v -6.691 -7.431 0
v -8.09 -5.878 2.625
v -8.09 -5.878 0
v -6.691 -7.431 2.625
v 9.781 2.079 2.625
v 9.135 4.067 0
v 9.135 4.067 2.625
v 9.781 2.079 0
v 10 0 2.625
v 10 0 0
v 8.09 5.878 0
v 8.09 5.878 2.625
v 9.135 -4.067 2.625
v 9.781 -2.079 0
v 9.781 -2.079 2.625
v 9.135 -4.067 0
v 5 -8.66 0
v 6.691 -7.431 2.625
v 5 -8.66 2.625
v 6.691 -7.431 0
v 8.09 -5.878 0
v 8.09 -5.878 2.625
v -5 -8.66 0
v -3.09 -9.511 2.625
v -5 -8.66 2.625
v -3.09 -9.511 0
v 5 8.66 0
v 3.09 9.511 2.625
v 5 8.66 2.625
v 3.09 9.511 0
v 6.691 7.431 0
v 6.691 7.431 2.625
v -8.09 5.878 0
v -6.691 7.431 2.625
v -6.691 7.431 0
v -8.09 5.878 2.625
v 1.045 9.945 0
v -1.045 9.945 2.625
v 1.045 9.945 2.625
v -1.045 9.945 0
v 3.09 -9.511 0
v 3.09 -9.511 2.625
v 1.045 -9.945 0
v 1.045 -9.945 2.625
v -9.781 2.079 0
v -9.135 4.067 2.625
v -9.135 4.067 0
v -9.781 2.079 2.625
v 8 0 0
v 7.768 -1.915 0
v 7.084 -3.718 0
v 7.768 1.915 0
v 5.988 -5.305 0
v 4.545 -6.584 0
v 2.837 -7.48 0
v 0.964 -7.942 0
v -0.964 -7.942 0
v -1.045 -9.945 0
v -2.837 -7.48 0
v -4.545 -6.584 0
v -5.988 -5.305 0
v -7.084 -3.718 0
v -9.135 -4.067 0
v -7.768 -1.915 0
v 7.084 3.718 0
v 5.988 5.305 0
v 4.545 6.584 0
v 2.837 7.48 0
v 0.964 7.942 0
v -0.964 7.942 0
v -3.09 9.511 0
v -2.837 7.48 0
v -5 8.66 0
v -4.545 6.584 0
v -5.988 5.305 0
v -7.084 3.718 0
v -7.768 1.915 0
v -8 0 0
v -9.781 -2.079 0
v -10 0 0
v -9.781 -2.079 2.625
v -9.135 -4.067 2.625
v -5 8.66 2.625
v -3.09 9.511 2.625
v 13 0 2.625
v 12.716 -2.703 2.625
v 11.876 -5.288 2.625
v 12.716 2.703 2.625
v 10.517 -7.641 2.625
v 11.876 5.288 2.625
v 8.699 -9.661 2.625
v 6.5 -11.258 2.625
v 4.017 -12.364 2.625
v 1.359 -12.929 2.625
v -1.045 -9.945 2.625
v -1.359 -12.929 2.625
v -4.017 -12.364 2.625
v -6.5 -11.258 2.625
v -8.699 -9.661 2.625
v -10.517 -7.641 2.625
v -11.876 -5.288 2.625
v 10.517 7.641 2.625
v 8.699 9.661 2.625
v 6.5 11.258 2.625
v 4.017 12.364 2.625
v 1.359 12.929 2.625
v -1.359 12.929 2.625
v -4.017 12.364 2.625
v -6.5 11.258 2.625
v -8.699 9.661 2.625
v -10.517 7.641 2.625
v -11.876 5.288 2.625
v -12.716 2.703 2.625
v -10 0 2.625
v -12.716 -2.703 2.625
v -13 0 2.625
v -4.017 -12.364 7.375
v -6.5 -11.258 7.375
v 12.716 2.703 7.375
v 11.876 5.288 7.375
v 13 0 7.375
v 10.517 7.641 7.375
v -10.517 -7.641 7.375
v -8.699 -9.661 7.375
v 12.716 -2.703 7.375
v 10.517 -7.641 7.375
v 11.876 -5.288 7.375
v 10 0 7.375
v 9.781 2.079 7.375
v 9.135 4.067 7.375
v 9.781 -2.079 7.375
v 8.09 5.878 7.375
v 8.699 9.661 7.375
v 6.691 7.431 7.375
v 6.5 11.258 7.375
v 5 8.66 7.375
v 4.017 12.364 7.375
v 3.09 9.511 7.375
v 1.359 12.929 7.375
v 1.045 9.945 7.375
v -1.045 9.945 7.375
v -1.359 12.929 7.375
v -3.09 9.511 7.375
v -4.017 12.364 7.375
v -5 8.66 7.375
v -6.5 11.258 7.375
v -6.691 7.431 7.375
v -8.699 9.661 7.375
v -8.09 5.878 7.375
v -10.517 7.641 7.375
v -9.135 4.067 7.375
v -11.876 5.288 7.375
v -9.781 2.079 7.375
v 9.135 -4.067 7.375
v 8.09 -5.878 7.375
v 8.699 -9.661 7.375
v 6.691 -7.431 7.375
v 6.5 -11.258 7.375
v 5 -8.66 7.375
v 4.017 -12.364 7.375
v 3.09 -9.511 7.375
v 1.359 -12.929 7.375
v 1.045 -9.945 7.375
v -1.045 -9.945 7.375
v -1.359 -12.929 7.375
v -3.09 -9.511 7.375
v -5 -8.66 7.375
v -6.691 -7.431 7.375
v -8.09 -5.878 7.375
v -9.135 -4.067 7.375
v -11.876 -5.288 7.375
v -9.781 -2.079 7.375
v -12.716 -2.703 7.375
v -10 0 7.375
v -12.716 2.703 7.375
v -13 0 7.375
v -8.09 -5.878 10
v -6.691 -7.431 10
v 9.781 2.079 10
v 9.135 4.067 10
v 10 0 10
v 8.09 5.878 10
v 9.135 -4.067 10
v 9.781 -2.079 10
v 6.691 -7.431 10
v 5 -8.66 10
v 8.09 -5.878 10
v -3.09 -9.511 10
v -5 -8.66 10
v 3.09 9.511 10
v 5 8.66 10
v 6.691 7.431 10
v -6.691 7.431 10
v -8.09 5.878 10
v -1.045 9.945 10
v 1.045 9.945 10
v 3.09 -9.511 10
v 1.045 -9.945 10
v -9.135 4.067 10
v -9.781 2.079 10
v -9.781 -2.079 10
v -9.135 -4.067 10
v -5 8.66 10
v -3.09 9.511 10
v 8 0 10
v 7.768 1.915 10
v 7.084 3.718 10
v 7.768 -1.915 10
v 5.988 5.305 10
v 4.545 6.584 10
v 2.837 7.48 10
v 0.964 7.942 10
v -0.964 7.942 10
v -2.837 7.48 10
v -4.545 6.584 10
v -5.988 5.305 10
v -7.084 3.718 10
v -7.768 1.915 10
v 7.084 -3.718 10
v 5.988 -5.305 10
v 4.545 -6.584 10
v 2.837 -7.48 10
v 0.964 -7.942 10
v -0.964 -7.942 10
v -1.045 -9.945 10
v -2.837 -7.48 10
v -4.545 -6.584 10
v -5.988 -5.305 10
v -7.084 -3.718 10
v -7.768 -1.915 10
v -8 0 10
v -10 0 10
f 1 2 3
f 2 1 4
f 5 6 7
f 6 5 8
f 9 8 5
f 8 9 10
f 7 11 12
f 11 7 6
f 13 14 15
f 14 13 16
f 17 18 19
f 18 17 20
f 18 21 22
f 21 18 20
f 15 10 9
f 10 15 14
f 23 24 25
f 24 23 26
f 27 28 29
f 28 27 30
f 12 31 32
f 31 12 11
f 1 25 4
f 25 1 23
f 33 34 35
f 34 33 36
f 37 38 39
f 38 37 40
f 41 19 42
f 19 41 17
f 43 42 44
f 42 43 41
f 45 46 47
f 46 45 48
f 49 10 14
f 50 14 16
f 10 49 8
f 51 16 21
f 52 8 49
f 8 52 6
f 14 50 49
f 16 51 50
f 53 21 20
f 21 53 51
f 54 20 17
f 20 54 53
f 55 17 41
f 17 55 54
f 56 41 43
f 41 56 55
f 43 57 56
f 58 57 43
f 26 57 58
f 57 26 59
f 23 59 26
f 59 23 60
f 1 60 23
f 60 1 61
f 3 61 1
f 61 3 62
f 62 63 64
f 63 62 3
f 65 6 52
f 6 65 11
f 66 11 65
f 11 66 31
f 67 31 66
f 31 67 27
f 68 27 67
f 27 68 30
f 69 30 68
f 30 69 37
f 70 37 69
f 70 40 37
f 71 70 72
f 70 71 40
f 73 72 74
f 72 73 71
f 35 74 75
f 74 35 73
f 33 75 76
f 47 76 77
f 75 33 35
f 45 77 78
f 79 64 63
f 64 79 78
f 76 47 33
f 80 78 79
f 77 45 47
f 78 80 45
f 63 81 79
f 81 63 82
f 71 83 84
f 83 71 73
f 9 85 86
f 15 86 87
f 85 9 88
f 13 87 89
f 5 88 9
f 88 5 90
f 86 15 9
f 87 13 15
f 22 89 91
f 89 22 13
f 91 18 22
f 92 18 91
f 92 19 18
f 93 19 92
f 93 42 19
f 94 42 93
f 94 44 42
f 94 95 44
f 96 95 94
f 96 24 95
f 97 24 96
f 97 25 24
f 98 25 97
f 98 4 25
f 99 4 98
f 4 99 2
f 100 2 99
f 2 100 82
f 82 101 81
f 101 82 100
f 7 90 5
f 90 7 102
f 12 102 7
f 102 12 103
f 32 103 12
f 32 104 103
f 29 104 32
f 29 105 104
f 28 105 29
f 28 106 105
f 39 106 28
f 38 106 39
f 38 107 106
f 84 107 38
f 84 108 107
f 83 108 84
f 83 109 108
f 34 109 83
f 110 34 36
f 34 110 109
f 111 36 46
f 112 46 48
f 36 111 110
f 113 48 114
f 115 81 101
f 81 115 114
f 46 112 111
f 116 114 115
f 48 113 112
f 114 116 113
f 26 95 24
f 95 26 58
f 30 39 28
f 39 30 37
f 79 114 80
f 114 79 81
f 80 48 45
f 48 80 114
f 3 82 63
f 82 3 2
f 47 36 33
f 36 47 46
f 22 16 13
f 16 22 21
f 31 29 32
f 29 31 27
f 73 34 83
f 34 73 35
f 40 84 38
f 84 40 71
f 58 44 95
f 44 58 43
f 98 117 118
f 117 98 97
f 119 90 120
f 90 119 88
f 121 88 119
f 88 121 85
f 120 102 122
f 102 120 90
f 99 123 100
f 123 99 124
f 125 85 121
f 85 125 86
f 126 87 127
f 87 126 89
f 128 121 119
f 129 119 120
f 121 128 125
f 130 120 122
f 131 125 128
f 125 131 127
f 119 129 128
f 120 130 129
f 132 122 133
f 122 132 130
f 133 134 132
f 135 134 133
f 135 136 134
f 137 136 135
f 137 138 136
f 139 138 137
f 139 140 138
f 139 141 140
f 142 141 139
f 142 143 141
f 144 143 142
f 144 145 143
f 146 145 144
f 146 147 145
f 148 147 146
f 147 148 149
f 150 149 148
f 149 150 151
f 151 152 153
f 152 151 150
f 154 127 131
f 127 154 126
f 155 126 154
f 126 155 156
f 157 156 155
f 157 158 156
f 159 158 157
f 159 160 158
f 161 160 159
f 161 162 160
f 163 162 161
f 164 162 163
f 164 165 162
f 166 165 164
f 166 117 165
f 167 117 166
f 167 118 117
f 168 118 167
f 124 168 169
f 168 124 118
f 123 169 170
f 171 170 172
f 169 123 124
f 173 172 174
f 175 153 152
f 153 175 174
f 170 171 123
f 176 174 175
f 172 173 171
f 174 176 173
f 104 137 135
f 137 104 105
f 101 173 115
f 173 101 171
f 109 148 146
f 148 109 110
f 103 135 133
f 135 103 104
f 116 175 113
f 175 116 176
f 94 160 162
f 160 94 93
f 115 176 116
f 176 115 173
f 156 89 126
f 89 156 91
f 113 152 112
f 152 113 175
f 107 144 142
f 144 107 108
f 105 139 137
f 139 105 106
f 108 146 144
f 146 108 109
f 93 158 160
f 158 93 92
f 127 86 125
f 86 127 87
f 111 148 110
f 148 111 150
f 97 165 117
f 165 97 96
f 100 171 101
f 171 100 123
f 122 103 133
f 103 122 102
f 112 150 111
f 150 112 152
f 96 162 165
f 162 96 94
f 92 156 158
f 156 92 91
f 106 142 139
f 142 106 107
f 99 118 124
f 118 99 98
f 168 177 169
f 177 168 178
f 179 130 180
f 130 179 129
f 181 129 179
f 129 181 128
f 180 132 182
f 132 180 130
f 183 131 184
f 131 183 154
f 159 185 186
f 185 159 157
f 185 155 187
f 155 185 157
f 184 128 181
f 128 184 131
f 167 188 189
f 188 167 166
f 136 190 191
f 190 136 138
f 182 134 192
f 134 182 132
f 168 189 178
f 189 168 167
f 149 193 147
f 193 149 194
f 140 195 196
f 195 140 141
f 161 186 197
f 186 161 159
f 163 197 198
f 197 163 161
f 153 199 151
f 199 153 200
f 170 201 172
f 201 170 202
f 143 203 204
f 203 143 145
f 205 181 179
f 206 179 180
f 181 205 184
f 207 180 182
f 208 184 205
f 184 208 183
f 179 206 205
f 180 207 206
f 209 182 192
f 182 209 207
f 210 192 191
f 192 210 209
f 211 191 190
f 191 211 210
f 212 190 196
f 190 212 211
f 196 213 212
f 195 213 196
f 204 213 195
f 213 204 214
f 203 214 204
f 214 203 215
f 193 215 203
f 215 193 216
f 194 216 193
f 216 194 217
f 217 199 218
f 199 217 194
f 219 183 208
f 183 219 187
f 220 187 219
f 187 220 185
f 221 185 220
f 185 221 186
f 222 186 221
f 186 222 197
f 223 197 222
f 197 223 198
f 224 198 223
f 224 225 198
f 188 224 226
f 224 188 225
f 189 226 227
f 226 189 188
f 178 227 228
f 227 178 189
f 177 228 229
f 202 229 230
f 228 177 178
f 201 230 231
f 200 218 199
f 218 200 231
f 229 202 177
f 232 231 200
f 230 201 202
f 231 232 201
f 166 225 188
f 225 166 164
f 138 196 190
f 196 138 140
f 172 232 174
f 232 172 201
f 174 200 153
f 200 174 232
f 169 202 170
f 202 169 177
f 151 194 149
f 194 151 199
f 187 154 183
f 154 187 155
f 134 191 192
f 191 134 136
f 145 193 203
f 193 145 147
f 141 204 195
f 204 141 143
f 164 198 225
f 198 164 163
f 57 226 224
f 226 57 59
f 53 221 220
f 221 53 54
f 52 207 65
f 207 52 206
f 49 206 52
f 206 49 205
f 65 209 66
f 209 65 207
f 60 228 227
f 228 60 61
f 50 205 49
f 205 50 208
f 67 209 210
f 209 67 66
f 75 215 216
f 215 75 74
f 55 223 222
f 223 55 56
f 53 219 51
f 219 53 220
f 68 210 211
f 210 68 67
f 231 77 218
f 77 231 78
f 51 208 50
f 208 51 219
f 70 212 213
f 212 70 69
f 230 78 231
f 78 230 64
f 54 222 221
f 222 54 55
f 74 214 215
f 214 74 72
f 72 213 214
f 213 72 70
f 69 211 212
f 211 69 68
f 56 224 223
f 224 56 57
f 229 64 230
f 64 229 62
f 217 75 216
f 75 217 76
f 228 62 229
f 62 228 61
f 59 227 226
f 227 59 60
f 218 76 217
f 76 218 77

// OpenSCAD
// Uncomment before rendering and exporting
//$fa = 0.01;
//$fs = 0.25;

// Module for creating the roller
module xAxisRoller()
{
    difference()
    {
        // Base shape
        union()
        {
            cylinder(2.625, 10, 10);
            translate([0, 0, 2.625])
            {
                cylinder(4.75, 13, 13);
            }
            translate([0, 0, 7.375])
            {
                cylinder(2.625, 10, 10);
            }
        }
        // Bearing cutout
        translate([0, 0, -1])
        {
            cylinder(12, 8, 8);
        }
    }
}

// Using the module
xAxisRoller();
